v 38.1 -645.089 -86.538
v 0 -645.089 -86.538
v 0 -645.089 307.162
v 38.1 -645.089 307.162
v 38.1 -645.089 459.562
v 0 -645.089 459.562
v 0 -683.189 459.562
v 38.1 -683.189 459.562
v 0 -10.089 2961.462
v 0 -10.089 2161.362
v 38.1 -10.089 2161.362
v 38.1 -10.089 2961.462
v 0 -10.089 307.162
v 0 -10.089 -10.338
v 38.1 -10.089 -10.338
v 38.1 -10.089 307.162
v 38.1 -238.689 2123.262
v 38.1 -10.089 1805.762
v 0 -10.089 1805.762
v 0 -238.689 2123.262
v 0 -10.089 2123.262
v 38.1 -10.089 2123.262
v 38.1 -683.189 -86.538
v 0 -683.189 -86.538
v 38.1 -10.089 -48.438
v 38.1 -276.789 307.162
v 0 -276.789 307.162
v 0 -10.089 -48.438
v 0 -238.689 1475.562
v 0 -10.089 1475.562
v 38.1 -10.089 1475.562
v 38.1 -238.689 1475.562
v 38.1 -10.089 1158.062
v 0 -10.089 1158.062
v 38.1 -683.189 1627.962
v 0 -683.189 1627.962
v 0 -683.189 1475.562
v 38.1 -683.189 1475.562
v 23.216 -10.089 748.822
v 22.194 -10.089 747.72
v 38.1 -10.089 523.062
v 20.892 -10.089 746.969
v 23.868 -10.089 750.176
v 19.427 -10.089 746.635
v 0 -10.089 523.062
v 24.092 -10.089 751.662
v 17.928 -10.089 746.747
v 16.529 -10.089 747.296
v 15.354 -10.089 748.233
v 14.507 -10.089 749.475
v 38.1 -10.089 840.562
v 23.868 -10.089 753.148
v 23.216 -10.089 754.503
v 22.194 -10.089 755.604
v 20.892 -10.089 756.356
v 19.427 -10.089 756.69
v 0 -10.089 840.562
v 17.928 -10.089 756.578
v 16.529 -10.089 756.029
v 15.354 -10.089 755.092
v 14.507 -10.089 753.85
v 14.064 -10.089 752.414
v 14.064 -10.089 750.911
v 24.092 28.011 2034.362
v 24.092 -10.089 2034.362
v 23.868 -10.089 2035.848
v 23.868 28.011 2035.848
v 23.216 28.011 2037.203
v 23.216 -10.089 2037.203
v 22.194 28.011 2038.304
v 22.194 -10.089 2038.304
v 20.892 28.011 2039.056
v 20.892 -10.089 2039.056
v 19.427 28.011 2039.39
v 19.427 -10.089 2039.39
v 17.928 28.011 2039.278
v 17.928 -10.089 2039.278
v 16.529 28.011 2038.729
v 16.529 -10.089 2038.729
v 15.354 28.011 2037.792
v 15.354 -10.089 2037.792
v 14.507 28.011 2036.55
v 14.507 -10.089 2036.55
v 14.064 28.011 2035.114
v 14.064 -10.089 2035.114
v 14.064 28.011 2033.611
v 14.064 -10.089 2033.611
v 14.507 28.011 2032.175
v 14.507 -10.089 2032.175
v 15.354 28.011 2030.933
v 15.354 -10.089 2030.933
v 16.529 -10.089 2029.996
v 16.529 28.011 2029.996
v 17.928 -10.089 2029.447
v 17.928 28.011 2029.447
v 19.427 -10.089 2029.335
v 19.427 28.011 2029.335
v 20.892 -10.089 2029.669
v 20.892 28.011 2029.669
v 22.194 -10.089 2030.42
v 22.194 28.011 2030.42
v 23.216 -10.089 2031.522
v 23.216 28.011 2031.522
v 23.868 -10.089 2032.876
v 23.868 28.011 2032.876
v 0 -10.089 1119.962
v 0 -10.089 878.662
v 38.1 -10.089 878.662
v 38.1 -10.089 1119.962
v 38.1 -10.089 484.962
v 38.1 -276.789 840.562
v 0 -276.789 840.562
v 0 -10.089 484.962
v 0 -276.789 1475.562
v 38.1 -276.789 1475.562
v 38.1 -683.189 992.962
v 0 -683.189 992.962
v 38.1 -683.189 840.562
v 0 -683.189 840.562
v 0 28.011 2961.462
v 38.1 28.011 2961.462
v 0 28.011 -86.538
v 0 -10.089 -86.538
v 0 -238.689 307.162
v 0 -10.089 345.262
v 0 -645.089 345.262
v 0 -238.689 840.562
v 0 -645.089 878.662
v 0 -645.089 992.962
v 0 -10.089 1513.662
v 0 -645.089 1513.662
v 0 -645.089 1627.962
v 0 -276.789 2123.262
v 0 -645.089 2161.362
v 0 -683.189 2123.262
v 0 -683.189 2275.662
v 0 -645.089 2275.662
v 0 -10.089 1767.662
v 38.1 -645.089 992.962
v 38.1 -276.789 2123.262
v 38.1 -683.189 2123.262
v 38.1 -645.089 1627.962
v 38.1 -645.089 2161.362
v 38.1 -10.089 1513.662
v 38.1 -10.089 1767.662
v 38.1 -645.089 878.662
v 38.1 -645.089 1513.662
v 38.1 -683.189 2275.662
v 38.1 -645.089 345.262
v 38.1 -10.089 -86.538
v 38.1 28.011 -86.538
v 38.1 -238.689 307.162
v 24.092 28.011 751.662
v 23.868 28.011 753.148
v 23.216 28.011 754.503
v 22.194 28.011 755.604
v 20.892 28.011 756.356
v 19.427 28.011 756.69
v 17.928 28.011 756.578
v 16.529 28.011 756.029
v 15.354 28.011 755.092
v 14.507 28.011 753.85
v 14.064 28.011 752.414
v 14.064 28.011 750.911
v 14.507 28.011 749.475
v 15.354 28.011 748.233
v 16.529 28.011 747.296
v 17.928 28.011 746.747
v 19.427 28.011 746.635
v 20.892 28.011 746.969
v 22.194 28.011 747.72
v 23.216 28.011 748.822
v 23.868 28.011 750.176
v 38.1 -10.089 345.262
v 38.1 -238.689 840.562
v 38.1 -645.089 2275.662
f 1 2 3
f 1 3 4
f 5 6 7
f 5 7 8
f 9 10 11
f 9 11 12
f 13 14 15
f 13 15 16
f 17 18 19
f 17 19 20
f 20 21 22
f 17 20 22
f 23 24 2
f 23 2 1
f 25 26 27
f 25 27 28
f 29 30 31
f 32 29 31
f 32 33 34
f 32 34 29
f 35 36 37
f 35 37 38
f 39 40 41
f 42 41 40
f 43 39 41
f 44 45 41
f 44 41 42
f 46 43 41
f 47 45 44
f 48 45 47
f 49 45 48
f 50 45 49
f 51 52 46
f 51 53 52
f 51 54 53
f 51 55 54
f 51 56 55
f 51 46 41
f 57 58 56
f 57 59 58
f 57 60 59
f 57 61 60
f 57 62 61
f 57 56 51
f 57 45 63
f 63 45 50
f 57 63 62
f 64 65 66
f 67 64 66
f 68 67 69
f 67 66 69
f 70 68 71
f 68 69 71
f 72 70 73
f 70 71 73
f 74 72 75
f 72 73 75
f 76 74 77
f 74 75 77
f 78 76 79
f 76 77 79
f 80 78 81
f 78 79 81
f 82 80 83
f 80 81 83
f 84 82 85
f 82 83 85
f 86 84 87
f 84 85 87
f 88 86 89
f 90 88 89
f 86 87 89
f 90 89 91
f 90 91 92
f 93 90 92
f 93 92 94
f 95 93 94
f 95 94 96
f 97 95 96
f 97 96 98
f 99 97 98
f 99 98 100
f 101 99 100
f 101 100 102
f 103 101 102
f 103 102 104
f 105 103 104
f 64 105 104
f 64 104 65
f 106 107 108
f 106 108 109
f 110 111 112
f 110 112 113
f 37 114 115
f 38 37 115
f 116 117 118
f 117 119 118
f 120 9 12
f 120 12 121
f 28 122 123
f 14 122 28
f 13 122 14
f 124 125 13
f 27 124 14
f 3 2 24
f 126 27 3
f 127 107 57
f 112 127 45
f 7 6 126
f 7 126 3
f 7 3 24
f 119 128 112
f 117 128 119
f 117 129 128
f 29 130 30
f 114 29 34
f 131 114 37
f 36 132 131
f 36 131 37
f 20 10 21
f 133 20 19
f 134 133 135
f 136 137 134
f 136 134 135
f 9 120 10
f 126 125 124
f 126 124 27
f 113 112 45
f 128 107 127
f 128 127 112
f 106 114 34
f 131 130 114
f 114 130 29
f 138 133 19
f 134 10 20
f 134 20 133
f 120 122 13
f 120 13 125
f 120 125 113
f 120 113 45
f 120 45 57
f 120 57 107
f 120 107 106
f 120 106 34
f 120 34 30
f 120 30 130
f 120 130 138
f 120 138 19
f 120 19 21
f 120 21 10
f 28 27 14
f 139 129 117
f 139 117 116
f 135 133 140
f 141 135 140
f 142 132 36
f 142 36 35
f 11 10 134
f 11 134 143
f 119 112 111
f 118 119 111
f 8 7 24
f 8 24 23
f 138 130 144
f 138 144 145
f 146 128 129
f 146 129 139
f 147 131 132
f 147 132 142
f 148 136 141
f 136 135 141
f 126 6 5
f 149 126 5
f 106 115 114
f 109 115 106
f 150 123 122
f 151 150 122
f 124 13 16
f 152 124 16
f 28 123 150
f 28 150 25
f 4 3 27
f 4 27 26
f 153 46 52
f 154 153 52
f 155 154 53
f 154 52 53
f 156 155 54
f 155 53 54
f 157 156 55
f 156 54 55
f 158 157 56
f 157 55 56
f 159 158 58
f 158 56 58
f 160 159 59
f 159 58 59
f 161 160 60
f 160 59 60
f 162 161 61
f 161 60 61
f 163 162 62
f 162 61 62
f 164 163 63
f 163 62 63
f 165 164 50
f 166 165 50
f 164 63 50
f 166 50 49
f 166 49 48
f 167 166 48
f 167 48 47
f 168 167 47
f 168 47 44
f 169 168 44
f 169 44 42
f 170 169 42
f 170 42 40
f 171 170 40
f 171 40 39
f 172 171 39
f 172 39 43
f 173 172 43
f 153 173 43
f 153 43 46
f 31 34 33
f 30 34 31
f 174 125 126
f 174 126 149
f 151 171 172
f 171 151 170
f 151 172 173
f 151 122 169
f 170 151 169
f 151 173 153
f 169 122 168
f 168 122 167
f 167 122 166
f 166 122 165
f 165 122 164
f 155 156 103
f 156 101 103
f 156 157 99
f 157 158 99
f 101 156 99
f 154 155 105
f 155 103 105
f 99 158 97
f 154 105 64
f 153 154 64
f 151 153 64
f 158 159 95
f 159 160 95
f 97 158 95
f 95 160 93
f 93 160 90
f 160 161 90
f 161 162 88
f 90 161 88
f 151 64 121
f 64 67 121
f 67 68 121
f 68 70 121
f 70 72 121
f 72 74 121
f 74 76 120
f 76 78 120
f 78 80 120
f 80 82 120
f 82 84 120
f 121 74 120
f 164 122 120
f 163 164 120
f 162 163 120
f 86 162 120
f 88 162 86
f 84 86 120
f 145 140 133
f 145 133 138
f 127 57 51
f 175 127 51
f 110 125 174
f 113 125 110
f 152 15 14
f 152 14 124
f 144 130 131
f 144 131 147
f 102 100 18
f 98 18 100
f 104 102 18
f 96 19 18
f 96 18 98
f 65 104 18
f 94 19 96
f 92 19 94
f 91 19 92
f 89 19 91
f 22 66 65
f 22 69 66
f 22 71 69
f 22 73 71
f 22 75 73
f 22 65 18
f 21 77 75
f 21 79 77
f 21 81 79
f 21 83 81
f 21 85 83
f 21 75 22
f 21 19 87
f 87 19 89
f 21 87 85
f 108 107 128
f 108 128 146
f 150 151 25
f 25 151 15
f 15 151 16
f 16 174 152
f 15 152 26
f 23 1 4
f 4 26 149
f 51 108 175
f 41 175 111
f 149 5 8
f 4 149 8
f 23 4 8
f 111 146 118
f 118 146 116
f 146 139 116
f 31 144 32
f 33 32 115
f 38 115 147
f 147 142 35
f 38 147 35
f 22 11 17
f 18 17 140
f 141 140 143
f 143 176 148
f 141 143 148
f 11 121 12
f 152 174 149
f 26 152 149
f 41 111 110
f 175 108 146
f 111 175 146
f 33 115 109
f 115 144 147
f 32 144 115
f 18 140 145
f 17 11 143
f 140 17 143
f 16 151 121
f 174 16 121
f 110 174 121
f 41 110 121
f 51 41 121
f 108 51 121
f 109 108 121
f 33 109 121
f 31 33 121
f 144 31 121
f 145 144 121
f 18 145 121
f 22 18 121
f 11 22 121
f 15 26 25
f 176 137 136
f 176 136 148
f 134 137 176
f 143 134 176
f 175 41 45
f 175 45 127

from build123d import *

# Parameters (mm, degrees)
F0_W      = 38.1
F0_H      = 3048
F1_DEPTH  = 38.1
F2_W      = 38.1
F2_H      = 38.1
F3_DEPTH  = 673.1
F4_W      = 38.1
F4_H      = 38.1
F5_DEPTH  = 114.3
F6_W      = 38.1
F6_H      = 38.1
F7_DEPTH  = 114.3
F8_W      = 38.1
F8_H      = 38.1
F9_DEPTH  = 114.3
F10_W     = 38.1
F10_H     = 38.1
F11_DEPTH = 114.3
F12_W     = 38.1
F12_H     = 38.1
F13_DEPTH = 393.7
F15_DEPTH = 38.1
F17_D     = 10.0838
F17_DEPTH = 38.101


with BuildPart() as f1:
    # F0 (on Right) → F1 (new body)
    with BuildSketch(Plane.YZ):
        with Locations((8.9606698602, 1437.4623473273)):
            Rectangle(F0_W, F0_H)
    extrude(amount=F1_DEPTH)

    # F2 (on face) → F3 (join)
    with BuildSketch(Plane.XZ.offset(10.0893301398)):
        with Locations((19.05, 2142.3123473273)):
            Rectangle(F2_W, F2_H)
        with Locations((19.05, 1494.6123473273)):
            Rectangle(F2_W, F2_H)
        with Locations((19.05, 859.6123473273)):
            Rectangle(F2_W, F2_H)
        with Locations((19.05, 326.2123473273)):
            Rectangle(F2_W, F2_H)
    extrude(amount=F3_DEPTH)

    # F4 (on face) → F5 (join)
    with BuildSketch(Plane.XY.offset(2161.3623473273)):
        with Locations((19.05, -664.1393301398)):
            Rectangle(F4_W, F4_H)
    extrude(amount=F5_DEPTH)

    # F6 (on face) → F7 (join)
    with BuildSketch(Plane.XY.offset(1513.6623473273)):
        with Locations((19.05, -664.1393301398)):
            Rectangle(F6_W, F6_H)
    extrude(amount=F7_DEPTH)

    # F8 (on face) → F9 (join)
    with BuildSketch(Plane.XY.offset(878.6623473273)):
        with Locations((19.05, -664.1393301398)):
            Rectangle(F8_W, F8_H)
    extrude(amount=F9_DEPTH)

    # F10 (on face) → F11 (join)
    with BuildSketch(Plane.XY.offset(345.2623473273)):
        with Locations((19.05, -664.1393301398)):
            Rectangle(F10_W, F10_H)
    extrude(amount=F11_DEPTH)

    # F12 (on face) → F13 (join, through all)
    with BuildSketch(Plane(origin=(0, 0, 307.1623473273), x_dir=(1, 0, 0), z_dir=(0, 0, -1))):
        with Locations((19.05, 664.1393301398)):
            Rectangle(F12_W, F12_H)
    extrude(amount=F13_DEPTH)

    # F14 (on face) → F15 (join)
    with BuildSketch(Plane.YZ.offset(38.1)):
        Polygon((-276.7893301398, 2123.2623473273), (-10.0893301398, 1767.6623473273), (-10.0893301398, 1805.7623473273), (-238.6893301398, 2123.2623473273), align=None)
        Polygon((-276.7893301398, 1475.5623473273), (-10.0893301398, 1119.9623473273), (-10.0893301398, 1158.0623473273), (-238.6893301398, 1475.5623473273), align=None)
        Polygon((-238.6893301398, 840.5623473273), (-276.7893301398, 840.5623473273), (-10.0893301398, 484.9623473273), (-10.0893301398, 523.0623473273), align=None)
        Polygon((-238.6893301398, 307.1623473273), (-276.7893301398, 307.1623473273), (-10.0893301398, -48.4376526727), (-10.0893301398, -10.3376526727), align=None)
    extrude(amount=-F15_DEPTH)

    # F17 (through all, one way)
    with BuildSketch(Plane.XZ.offset(10.0893301398)):
        with Locations((19.05, 2034.3623473273), (19.05, 751.6623473273)):
            Circle(F17_D / 2)
    extrude(amount=-F17_DEPTH, mode=Mode.SUBTRACT)


solid = f1.part
